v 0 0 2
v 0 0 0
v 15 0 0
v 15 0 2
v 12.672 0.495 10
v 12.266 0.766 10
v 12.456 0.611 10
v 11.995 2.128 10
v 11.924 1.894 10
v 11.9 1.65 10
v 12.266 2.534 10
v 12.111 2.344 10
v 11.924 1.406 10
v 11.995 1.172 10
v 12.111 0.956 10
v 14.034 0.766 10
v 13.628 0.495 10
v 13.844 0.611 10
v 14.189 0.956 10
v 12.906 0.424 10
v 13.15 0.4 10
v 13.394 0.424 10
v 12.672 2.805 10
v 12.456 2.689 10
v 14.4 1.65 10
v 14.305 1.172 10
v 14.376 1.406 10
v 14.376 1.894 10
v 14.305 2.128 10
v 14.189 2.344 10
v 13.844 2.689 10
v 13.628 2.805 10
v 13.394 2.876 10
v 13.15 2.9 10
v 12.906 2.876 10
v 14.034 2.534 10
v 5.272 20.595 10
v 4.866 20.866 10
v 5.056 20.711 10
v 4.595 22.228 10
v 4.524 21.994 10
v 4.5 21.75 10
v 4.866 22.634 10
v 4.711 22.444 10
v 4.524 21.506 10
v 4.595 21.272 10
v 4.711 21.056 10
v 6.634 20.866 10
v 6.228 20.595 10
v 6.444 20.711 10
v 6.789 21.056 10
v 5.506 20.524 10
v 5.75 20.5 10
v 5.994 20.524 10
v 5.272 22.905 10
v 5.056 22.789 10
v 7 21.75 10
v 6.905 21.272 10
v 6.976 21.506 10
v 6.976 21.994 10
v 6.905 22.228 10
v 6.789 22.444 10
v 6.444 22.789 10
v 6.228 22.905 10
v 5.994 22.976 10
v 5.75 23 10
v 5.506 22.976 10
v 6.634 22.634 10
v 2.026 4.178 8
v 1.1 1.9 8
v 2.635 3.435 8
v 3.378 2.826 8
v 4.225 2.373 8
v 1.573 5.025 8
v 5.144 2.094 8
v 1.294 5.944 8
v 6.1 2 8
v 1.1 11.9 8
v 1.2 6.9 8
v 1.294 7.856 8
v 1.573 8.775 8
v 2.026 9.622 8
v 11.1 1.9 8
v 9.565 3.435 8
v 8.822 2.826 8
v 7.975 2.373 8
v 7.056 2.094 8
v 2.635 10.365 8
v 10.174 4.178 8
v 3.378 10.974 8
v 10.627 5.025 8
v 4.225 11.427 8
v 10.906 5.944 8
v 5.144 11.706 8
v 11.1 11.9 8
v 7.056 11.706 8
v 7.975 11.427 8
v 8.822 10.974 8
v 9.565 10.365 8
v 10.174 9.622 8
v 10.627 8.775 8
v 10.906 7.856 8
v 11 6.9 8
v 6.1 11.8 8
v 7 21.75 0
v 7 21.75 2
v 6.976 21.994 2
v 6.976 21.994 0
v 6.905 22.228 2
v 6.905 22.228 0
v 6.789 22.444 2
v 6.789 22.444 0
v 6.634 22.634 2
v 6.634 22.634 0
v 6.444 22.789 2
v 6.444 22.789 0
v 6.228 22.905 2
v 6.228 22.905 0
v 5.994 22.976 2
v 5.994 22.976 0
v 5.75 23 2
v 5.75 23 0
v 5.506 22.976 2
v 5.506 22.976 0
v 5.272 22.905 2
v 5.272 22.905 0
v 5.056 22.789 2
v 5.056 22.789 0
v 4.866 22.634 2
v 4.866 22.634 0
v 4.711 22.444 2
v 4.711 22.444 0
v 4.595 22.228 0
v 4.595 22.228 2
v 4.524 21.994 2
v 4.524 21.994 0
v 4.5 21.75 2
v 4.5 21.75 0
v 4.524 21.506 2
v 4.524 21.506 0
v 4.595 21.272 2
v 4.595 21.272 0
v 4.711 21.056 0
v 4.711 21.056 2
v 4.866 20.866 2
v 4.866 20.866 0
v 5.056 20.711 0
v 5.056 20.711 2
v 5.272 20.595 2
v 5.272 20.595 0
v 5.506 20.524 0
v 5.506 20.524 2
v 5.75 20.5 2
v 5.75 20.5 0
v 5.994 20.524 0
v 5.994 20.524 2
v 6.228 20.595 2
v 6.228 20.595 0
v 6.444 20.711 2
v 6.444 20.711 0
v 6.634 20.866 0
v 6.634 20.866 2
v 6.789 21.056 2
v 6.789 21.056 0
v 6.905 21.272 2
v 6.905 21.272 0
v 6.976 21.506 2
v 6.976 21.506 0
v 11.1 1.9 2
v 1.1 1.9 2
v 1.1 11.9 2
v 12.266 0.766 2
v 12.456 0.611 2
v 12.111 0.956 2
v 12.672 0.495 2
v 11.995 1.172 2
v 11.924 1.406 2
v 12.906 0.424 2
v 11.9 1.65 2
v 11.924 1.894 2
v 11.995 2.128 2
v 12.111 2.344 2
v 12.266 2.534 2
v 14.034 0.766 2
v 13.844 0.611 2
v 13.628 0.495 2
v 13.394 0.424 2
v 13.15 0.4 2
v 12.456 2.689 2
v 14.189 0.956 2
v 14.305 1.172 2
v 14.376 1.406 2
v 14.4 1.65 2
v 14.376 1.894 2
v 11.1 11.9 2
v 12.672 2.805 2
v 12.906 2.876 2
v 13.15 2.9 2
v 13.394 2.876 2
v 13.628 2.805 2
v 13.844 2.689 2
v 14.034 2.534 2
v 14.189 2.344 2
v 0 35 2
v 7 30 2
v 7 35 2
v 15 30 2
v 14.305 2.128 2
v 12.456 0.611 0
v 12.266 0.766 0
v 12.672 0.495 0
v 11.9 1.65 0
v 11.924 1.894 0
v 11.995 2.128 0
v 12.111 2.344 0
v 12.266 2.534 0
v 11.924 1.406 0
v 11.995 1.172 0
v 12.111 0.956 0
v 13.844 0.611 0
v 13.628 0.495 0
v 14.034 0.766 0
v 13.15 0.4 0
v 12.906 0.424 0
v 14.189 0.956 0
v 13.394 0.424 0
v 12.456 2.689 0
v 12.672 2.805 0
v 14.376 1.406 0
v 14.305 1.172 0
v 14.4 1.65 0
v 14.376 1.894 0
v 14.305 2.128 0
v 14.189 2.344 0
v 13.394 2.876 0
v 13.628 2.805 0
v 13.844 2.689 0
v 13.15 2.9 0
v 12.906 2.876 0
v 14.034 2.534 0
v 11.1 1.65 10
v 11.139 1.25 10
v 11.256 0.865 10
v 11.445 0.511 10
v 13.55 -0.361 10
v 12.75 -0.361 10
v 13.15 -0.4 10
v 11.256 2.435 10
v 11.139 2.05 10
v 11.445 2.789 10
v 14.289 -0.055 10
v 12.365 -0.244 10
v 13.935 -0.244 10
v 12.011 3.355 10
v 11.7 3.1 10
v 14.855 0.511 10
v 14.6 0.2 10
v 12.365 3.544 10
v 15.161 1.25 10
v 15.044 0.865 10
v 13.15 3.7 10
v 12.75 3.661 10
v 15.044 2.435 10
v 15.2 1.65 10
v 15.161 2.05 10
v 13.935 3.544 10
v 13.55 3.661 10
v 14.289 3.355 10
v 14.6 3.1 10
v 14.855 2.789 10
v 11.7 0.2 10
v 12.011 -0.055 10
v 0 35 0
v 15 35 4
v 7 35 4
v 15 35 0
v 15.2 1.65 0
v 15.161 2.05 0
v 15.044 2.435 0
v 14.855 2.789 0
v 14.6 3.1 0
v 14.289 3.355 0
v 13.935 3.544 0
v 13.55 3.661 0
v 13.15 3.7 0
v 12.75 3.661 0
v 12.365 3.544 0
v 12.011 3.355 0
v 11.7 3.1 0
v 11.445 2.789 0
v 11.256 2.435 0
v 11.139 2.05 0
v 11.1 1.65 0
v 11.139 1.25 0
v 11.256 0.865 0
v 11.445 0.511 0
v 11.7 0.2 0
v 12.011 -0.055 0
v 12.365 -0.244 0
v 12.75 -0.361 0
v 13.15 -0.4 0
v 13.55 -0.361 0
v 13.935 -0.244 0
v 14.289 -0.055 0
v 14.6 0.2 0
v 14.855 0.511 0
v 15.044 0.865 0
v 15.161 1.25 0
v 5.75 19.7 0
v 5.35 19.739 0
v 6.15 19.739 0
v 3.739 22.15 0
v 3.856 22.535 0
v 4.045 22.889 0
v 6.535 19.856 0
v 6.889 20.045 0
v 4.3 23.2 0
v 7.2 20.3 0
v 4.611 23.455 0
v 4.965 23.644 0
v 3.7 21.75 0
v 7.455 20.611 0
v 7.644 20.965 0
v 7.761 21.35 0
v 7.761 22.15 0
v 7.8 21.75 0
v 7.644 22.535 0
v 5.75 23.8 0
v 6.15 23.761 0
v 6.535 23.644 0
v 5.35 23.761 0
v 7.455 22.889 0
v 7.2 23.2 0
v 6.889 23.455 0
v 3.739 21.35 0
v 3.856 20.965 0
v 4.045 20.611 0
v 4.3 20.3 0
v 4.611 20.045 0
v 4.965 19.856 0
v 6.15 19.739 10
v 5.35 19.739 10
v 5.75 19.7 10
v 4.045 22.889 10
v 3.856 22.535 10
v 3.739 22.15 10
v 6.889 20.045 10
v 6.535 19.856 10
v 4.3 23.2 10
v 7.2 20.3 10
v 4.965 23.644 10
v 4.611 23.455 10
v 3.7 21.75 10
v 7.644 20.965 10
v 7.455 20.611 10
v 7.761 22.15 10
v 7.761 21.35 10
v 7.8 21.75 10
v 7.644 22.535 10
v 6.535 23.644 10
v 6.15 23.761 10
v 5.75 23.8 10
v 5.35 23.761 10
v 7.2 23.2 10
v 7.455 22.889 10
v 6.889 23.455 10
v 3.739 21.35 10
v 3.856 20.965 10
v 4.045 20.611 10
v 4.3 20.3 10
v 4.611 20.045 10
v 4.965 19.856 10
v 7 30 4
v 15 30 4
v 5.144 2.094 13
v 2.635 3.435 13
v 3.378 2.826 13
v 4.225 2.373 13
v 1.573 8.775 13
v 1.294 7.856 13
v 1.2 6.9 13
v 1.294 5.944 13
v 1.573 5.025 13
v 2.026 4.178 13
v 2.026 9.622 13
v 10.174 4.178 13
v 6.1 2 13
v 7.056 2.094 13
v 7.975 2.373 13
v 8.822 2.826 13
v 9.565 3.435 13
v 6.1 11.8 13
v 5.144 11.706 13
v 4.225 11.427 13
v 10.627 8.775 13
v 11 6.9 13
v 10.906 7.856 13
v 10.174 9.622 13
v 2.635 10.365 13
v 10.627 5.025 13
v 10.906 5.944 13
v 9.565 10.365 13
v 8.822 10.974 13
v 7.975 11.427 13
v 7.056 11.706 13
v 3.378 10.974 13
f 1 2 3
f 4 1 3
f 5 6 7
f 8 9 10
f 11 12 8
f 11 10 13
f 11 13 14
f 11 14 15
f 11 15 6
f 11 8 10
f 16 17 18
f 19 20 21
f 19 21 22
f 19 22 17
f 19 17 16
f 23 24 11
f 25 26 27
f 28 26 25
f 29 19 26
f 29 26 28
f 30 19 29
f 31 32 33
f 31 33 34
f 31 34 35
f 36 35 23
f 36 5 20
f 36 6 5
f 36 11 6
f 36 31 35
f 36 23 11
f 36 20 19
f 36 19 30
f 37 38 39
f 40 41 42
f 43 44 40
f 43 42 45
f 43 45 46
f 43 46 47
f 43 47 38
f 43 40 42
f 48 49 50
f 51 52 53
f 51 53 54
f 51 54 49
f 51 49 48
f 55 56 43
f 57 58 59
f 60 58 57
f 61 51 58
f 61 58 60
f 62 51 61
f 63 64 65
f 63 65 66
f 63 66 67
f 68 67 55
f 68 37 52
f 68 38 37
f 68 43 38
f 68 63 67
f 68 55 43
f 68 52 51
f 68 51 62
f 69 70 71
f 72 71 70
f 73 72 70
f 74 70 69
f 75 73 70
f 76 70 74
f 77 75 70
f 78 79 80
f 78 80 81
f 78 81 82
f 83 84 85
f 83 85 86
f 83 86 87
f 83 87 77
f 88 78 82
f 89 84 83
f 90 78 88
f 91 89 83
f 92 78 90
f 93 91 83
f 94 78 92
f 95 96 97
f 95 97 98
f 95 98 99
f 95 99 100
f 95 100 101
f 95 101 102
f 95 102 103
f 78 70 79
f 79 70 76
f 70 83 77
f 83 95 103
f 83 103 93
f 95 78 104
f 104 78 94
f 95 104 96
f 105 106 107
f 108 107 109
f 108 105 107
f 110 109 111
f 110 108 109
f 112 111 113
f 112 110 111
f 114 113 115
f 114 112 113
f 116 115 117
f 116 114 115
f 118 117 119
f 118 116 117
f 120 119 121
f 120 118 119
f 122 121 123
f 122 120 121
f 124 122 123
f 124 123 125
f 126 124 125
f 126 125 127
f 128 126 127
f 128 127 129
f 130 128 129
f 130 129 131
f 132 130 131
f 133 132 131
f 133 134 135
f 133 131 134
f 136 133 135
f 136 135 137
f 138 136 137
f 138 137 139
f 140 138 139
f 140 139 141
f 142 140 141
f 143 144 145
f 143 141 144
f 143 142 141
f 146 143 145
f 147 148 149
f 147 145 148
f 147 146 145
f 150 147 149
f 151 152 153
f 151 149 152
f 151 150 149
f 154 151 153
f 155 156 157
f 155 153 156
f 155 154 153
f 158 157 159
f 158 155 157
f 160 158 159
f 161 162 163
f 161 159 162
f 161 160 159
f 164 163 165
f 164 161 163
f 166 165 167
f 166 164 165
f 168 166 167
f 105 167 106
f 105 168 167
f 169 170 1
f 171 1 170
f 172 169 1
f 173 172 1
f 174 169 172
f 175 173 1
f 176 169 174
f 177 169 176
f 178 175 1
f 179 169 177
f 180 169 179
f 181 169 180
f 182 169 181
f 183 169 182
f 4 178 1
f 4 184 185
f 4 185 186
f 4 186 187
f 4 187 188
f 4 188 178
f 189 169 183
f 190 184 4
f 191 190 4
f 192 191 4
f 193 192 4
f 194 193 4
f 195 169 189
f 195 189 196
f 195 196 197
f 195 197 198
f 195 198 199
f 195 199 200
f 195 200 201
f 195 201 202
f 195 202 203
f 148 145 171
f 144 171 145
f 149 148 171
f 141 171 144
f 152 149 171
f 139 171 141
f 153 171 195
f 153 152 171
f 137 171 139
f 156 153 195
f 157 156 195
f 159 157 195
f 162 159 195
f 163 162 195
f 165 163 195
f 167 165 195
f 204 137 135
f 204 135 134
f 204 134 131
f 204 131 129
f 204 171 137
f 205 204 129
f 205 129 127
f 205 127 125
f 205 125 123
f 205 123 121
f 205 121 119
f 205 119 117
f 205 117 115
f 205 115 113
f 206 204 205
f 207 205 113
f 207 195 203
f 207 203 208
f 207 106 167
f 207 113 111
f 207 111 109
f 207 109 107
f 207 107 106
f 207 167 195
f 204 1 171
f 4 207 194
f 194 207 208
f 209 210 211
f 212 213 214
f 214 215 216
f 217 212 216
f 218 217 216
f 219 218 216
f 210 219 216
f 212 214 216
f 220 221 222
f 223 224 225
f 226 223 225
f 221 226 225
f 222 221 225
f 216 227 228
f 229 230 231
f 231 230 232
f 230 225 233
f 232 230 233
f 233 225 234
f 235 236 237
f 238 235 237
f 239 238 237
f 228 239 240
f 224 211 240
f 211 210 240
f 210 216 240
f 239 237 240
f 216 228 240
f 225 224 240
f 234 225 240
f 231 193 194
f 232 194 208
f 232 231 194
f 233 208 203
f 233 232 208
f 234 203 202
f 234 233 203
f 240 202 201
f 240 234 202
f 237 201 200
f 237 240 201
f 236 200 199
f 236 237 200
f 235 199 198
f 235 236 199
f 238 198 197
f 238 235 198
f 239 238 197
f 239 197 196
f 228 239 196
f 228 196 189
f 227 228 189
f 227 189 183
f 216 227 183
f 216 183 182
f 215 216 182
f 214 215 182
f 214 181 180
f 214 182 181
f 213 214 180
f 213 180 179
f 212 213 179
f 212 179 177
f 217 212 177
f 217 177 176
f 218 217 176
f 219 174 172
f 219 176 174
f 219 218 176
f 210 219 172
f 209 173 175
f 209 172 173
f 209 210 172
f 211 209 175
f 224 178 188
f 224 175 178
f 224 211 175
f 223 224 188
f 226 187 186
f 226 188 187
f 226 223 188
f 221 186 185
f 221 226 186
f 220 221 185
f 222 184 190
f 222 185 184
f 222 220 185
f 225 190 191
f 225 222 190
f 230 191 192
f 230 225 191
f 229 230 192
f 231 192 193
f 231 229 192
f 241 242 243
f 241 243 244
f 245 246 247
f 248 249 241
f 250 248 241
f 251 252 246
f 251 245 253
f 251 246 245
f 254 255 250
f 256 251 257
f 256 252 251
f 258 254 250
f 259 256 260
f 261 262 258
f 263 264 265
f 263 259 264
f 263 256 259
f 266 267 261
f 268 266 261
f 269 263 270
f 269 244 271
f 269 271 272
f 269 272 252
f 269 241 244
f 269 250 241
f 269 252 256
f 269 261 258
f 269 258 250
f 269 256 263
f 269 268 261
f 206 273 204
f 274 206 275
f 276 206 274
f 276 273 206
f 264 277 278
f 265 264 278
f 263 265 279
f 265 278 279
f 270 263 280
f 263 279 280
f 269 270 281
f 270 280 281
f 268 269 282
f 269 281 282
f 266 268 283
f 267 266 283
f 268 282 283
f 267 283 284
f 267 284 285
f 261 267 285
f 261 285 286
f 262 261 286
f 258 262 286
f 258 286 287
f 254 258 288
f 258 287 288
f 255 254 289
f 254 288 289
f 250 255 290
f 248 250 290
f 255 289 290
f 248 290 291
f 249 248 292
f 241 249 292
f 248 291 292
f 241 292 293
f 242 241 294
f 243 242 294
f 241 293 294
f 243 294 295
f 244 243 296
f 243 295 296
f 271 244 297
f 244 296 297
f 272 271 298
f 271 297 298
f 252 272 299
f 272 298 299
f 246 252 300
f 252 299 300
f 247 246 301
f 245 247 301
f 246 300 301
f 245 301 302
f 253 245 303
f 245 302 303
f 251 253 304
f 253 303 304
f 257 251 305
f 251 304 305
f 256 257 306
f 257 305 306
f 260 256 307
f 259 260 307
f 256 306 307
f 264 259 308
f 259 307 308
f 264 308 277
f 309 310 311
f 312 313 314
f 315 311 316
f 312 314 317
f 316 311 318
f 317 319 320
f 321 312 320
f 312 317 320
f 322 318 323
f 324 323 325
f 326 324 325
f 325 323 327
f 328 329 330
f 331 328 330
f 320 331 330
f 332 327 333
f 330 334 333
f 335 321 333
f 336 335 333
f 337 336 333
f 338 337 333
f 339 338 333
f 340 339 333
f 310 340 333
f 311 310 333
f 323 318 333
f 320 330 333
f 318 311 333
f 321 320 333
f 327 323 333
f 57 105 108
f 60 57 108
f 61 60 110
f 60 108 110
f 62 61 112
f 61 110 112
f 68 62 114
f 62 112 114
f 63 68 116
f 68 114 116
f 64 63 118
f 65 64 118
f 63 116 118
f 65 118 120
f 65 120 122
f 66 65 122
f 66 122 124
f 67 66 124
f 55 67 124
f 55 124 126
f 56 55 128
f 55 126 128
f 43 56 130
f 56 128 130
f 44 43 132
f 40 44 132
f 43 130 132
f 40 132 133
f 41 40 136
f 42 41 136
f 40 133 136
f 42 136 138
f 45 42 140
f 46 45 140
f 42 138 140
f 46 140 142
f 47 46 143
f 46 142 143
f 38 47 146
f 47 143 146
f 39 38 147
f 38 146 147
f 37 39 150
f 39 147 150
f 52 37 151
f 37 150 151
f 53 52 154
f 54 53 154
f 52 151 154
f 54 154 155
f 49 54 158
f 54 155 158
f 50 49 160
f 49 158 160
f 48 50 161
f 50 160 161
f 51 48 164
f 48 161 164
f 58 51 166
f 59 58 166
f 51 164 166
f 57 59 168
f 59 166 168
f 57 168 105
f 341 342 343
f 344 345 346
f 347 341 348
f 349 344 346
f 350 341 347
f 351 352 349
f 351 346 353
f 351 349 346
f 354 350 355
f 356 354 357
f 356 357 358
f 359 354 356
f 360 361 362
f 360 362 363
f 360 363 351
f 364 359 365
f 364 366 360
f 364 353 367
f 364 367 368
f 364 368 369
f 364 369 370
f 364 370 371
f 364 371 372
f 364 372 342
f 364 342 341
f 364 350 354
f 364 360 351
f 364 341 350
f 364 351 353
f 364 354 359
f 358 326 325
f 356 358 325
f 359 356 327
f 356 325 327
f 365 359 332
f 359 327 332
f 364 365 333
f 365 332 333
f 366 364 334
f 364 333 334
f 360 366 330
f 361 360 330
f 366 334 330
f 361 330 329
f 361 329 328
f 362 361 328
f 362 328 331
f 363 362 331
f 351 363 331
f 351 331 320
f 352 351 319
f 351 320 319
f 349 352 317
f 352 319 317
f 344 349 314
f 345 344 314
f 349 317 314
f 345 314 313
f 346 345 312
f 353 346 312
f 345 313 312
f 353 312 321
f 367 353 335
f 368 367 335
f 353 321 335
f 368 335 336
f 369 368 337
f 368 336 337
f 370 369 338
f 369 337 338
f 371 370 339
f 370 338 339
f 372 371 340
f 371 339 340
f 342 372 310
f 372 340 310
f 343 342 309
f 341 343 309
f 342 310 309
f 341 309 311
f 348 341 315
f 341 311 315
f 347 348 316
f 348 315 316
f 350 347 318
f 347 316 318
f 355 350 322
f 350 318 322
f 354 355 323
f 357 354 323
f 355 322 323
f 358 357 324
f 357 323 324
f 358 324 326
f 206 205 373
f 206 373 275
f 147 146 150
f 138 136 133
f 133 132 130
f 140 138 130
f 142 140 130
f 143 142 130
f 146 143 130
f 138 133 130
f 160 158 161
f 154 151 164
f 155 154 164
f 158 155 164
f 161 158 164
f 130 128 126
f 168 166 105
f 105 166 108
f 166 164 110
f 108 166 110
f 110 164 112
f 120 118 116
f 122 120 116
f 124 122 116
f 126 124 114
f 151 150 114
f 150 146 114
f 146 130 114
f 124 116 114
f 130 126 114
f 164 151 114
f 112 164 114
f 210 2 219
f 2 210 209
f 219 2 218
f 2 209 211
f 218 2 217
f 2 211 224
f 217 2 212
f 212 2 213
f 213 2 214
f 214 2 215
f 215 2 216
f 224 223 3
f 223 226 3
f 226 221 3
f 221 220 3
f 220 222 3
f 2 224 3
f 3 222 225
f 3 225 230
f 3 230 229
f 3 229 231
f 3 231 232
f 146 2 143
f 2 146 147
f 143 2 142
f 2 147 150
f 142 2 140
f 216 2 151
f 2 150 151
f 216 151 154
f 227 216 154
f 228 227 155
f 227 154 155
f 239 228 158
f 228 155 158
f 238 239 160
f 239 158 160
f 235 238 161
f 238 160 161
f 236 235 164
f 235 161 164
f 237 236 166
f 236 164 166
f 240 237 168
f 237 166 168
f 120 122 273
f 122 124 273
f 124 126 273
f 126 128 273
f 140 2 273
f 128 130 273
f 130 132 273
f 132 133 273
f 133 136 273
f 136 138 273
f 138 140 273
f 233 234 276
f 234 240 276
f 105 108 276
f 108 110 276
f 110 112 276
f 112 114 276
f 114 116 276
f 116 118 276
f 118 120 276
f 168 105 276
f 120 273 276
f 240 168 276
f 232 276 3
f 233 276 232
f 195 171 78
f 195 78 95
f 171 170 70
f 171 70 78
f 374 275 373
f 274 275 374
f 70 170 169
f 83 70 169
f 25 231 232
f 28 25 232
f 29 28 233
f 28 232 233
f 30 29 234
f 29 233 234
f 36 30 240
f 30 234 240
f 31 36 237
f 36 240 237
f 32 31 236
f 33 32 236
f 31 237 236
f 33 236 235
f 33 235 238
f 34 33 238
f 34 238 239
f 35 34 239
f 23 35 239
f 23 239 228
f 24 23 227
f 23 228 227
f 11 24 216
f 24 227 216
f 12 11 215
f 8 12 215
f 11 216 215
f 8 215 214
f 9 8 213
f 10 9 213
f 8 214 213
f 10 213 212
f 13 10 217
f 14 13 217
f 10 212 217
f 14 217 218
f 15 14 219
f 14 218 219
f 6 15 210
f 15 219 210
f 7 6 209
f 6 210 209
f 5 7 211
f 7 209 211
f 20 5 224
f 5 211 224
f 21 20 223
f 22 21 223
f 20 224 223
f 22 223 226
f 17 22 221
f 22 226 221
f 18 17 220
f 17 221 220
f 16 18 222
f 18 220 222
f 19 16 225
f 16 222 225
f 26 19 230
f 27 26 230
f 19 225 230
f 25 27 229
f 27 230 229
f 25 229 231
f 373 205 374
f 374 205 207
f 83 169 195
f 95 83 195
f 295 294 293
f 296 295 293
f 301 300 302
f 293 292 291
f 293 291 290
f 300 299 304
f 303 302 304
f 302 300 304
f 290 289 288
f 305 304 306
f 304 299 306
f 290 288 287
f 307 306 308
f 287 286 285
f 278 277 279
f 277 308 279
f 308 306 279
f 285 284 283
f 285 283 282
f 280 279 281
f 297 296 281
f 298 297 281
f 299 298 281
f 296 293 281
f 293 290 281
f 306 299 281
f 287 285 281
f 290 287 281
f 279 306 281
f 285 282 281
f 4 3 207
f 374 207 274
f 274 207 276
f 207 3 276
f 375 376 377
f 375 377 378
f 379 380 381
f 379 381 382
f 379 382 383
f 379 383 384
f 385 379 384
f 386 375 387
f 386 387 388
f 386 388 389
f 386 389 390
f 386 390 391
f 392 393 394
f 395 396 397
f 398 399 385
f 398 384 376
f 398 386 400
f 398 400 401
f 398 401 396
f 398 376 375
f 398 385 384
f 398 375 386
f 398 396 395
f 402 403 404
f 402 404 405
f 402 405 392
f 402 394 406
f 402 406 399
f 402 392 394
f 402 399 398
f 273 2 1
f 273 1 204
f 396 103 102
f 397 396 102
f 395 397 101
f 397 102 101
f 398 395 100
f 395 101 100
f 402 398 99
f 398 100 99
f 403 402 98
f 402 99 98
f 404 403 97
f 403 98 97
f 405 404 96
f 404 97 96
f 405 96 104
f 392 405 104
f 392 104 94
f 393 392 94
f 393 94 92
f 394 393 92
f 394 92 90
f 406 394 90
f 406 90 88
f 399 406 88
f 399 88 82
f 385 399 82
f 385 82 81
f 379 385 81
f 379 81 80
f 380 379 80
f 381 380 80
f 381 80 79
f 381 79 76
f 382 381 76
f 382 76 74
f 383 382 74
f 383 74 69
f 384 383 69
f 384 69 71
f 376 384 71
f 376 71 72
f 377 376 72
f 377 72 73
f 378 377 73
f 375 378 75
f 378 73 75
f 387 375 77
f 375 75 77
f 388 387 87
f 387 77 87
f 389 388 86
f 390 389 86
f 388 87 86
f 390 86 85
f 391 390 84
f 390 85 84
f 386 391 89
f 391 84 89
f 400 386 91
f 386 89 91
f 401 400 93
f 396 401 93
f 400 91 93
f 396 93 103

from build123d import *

# Parameters (mm, degrees)
CYLINDER001_R     = 1.25
CYLINDER001_DEPTH = 10
CYLINDER002_R     = 1.25
CYLINDER002_DEPTH = 10
BOX_W             = 15
BOX_H             = 35
BOX_DEPTH         = 2
BOX001_W          = 10
BOX001_H          = 10
BOX001_DEPTH      = 8
CYLINDER_R        = 4.9
CYLINDER_DEPTH    = 13
BOX002_W          = 8
BOX002_H          = 5
BOX002_DEPTH      = 4
CYLINDER003_R     = 1.25
CYLINDER003_DEPTH = 10
CYLINDER004_R     = 1.25
CYLINDER004_DEPTH = 10
CYLINDER005_R     = 2.05
CYLINDER005_DEPTH = 10
CYLINDER006_R     = 2.05
CYLINDER006_DEPTH = 10


with BuildPart() as cylinder001:
    # Cylinder001 → Cylinder001 (new body)
    with BuildSketch(Plane(origin=(5.75, 21.75, 0), x_dir=(1, 0, 0), z_dir=(0, 0, 1))):
        Circle(CYLINDER001_R)
    extrude(amount=CYLINDER001_DEPTH)


with BuildPart() as screwholes:
    # Cylinder002 → Cylinder002 (new body)
    with BuildSketch(Plane(origin=(13.15, 1.65, 0), x_dir=(1, 0, 0), z_dir=(0, 0, 1))):
        Circle(CYLINDER002_R)
    extrude(amount=CYLINDER002_DEPTH)

    # Fusion001: union Cylinder001
    add(cylinder001.part)


with BuildPart() as cube:
    # Box → Box (new body)
    with BuildSketch(Plane.XY):
        with Locations((7.5, 17.5)):
            Rectangle(BOX_W, BOX_H)
    extrude(amount=BOX_DEPTH)


with BuildPart() as cube001:
    # Box001 → Box001 (new body)
    with BuildSketch(Plane(origin=(1.1, 1.9, 0), x_dir=(1, 0, 0), z_dir=(0, 0, 1))):
        with Locations((5, 5)):
            Rectangle(BOX001_W, BOX001_H)
    extrude(amount=BOX001_DEPTH)


with BuildPart() as cylinder:
    # Cylinder → Cylinder (new body)
    with BuildSketch(Plane(origin=(6.1, 6.9, 0), x_dir=(1, 0, 0), z_dir=(0, 0, 1))):
        Circle(CYLINDER_R)
    extrude(amount=CYLINDER_DEPTH)


with BuildPart() as modelwithholes:
    # Box002 → Box002 (new body)
    with BuildSketch(Plane(origin=(7, 30, 0), x_dir=(1, 0, 0), z_dir=(0, 0, 1))):
        with Locations((4, 2.5)):
            Rectangle(BOX002_W, BOX002_H)
    extrude(amount=BOX002_DEPTH)

    # Fusion: union Cube, Cube001, Cylinder
    add(cube.part)
    add(cube001.part)
    add(cylinder.part)

    # Cut: cut ScrewHoles
    add(screwholes.part, mode=Mode.SUBTRACT)


with BuildPart() as cylinder003:
    # Cylinder003 → Cylinder003 (new body)
    with BuildSketch(Plane(origin=(5.75, 21.75, 0), x_dir=(1, 0, 0), z_dir=(0, 0, 1))):
        Circle(CYLINDER003_R)
    extrude(amount=CYLINDER003_DEPTH)


with BuildPart() as screwtemplates_through:
    # Cylinder004 → Cylinder004 (new body)
    with BuildSketch(Plane(origin=(13.15, 1.65, 0), x_dir=(1, 0, 0), z_dir=(0, 0, 1))):
        Circle(CYLINDER004_R)
    extrude(amount=CYLINDER004_DEPTH)

    # Fusion002: union Cylinder003
    add(cylinder003.part)


with BuildPart() as cylinder005:
    # Cylinder005 → Cylinder005 (new body)
    with BuildSketch(Plane(origin=(5.75, 21.75, 0), x_dir=(1, 0, 0), z_dir=(0, 0, 1))):
        Circle(CYLINDER005_R)
    extrude(amount=CYLINDER005_DEPTH)


with BuildPart() as screwtemplates_core:
    # Cylinder006 → Cylinder006 (new body)
    with BuildSketch(Plane(origin=(13.15, 1.65, 0), x_dir=(1, 0, 0), z_dir=(0, 0, 1))):
        Circle(CYLINDER006_R)
    extrude(amount=CYLINDER006_DEPTH)

    # Fusion003: union Cylinder005
    add(cylinder005.part)


solid = Compound([modelwithholes.part, screwtemplates_through.part, screwtemplates_core.part])
